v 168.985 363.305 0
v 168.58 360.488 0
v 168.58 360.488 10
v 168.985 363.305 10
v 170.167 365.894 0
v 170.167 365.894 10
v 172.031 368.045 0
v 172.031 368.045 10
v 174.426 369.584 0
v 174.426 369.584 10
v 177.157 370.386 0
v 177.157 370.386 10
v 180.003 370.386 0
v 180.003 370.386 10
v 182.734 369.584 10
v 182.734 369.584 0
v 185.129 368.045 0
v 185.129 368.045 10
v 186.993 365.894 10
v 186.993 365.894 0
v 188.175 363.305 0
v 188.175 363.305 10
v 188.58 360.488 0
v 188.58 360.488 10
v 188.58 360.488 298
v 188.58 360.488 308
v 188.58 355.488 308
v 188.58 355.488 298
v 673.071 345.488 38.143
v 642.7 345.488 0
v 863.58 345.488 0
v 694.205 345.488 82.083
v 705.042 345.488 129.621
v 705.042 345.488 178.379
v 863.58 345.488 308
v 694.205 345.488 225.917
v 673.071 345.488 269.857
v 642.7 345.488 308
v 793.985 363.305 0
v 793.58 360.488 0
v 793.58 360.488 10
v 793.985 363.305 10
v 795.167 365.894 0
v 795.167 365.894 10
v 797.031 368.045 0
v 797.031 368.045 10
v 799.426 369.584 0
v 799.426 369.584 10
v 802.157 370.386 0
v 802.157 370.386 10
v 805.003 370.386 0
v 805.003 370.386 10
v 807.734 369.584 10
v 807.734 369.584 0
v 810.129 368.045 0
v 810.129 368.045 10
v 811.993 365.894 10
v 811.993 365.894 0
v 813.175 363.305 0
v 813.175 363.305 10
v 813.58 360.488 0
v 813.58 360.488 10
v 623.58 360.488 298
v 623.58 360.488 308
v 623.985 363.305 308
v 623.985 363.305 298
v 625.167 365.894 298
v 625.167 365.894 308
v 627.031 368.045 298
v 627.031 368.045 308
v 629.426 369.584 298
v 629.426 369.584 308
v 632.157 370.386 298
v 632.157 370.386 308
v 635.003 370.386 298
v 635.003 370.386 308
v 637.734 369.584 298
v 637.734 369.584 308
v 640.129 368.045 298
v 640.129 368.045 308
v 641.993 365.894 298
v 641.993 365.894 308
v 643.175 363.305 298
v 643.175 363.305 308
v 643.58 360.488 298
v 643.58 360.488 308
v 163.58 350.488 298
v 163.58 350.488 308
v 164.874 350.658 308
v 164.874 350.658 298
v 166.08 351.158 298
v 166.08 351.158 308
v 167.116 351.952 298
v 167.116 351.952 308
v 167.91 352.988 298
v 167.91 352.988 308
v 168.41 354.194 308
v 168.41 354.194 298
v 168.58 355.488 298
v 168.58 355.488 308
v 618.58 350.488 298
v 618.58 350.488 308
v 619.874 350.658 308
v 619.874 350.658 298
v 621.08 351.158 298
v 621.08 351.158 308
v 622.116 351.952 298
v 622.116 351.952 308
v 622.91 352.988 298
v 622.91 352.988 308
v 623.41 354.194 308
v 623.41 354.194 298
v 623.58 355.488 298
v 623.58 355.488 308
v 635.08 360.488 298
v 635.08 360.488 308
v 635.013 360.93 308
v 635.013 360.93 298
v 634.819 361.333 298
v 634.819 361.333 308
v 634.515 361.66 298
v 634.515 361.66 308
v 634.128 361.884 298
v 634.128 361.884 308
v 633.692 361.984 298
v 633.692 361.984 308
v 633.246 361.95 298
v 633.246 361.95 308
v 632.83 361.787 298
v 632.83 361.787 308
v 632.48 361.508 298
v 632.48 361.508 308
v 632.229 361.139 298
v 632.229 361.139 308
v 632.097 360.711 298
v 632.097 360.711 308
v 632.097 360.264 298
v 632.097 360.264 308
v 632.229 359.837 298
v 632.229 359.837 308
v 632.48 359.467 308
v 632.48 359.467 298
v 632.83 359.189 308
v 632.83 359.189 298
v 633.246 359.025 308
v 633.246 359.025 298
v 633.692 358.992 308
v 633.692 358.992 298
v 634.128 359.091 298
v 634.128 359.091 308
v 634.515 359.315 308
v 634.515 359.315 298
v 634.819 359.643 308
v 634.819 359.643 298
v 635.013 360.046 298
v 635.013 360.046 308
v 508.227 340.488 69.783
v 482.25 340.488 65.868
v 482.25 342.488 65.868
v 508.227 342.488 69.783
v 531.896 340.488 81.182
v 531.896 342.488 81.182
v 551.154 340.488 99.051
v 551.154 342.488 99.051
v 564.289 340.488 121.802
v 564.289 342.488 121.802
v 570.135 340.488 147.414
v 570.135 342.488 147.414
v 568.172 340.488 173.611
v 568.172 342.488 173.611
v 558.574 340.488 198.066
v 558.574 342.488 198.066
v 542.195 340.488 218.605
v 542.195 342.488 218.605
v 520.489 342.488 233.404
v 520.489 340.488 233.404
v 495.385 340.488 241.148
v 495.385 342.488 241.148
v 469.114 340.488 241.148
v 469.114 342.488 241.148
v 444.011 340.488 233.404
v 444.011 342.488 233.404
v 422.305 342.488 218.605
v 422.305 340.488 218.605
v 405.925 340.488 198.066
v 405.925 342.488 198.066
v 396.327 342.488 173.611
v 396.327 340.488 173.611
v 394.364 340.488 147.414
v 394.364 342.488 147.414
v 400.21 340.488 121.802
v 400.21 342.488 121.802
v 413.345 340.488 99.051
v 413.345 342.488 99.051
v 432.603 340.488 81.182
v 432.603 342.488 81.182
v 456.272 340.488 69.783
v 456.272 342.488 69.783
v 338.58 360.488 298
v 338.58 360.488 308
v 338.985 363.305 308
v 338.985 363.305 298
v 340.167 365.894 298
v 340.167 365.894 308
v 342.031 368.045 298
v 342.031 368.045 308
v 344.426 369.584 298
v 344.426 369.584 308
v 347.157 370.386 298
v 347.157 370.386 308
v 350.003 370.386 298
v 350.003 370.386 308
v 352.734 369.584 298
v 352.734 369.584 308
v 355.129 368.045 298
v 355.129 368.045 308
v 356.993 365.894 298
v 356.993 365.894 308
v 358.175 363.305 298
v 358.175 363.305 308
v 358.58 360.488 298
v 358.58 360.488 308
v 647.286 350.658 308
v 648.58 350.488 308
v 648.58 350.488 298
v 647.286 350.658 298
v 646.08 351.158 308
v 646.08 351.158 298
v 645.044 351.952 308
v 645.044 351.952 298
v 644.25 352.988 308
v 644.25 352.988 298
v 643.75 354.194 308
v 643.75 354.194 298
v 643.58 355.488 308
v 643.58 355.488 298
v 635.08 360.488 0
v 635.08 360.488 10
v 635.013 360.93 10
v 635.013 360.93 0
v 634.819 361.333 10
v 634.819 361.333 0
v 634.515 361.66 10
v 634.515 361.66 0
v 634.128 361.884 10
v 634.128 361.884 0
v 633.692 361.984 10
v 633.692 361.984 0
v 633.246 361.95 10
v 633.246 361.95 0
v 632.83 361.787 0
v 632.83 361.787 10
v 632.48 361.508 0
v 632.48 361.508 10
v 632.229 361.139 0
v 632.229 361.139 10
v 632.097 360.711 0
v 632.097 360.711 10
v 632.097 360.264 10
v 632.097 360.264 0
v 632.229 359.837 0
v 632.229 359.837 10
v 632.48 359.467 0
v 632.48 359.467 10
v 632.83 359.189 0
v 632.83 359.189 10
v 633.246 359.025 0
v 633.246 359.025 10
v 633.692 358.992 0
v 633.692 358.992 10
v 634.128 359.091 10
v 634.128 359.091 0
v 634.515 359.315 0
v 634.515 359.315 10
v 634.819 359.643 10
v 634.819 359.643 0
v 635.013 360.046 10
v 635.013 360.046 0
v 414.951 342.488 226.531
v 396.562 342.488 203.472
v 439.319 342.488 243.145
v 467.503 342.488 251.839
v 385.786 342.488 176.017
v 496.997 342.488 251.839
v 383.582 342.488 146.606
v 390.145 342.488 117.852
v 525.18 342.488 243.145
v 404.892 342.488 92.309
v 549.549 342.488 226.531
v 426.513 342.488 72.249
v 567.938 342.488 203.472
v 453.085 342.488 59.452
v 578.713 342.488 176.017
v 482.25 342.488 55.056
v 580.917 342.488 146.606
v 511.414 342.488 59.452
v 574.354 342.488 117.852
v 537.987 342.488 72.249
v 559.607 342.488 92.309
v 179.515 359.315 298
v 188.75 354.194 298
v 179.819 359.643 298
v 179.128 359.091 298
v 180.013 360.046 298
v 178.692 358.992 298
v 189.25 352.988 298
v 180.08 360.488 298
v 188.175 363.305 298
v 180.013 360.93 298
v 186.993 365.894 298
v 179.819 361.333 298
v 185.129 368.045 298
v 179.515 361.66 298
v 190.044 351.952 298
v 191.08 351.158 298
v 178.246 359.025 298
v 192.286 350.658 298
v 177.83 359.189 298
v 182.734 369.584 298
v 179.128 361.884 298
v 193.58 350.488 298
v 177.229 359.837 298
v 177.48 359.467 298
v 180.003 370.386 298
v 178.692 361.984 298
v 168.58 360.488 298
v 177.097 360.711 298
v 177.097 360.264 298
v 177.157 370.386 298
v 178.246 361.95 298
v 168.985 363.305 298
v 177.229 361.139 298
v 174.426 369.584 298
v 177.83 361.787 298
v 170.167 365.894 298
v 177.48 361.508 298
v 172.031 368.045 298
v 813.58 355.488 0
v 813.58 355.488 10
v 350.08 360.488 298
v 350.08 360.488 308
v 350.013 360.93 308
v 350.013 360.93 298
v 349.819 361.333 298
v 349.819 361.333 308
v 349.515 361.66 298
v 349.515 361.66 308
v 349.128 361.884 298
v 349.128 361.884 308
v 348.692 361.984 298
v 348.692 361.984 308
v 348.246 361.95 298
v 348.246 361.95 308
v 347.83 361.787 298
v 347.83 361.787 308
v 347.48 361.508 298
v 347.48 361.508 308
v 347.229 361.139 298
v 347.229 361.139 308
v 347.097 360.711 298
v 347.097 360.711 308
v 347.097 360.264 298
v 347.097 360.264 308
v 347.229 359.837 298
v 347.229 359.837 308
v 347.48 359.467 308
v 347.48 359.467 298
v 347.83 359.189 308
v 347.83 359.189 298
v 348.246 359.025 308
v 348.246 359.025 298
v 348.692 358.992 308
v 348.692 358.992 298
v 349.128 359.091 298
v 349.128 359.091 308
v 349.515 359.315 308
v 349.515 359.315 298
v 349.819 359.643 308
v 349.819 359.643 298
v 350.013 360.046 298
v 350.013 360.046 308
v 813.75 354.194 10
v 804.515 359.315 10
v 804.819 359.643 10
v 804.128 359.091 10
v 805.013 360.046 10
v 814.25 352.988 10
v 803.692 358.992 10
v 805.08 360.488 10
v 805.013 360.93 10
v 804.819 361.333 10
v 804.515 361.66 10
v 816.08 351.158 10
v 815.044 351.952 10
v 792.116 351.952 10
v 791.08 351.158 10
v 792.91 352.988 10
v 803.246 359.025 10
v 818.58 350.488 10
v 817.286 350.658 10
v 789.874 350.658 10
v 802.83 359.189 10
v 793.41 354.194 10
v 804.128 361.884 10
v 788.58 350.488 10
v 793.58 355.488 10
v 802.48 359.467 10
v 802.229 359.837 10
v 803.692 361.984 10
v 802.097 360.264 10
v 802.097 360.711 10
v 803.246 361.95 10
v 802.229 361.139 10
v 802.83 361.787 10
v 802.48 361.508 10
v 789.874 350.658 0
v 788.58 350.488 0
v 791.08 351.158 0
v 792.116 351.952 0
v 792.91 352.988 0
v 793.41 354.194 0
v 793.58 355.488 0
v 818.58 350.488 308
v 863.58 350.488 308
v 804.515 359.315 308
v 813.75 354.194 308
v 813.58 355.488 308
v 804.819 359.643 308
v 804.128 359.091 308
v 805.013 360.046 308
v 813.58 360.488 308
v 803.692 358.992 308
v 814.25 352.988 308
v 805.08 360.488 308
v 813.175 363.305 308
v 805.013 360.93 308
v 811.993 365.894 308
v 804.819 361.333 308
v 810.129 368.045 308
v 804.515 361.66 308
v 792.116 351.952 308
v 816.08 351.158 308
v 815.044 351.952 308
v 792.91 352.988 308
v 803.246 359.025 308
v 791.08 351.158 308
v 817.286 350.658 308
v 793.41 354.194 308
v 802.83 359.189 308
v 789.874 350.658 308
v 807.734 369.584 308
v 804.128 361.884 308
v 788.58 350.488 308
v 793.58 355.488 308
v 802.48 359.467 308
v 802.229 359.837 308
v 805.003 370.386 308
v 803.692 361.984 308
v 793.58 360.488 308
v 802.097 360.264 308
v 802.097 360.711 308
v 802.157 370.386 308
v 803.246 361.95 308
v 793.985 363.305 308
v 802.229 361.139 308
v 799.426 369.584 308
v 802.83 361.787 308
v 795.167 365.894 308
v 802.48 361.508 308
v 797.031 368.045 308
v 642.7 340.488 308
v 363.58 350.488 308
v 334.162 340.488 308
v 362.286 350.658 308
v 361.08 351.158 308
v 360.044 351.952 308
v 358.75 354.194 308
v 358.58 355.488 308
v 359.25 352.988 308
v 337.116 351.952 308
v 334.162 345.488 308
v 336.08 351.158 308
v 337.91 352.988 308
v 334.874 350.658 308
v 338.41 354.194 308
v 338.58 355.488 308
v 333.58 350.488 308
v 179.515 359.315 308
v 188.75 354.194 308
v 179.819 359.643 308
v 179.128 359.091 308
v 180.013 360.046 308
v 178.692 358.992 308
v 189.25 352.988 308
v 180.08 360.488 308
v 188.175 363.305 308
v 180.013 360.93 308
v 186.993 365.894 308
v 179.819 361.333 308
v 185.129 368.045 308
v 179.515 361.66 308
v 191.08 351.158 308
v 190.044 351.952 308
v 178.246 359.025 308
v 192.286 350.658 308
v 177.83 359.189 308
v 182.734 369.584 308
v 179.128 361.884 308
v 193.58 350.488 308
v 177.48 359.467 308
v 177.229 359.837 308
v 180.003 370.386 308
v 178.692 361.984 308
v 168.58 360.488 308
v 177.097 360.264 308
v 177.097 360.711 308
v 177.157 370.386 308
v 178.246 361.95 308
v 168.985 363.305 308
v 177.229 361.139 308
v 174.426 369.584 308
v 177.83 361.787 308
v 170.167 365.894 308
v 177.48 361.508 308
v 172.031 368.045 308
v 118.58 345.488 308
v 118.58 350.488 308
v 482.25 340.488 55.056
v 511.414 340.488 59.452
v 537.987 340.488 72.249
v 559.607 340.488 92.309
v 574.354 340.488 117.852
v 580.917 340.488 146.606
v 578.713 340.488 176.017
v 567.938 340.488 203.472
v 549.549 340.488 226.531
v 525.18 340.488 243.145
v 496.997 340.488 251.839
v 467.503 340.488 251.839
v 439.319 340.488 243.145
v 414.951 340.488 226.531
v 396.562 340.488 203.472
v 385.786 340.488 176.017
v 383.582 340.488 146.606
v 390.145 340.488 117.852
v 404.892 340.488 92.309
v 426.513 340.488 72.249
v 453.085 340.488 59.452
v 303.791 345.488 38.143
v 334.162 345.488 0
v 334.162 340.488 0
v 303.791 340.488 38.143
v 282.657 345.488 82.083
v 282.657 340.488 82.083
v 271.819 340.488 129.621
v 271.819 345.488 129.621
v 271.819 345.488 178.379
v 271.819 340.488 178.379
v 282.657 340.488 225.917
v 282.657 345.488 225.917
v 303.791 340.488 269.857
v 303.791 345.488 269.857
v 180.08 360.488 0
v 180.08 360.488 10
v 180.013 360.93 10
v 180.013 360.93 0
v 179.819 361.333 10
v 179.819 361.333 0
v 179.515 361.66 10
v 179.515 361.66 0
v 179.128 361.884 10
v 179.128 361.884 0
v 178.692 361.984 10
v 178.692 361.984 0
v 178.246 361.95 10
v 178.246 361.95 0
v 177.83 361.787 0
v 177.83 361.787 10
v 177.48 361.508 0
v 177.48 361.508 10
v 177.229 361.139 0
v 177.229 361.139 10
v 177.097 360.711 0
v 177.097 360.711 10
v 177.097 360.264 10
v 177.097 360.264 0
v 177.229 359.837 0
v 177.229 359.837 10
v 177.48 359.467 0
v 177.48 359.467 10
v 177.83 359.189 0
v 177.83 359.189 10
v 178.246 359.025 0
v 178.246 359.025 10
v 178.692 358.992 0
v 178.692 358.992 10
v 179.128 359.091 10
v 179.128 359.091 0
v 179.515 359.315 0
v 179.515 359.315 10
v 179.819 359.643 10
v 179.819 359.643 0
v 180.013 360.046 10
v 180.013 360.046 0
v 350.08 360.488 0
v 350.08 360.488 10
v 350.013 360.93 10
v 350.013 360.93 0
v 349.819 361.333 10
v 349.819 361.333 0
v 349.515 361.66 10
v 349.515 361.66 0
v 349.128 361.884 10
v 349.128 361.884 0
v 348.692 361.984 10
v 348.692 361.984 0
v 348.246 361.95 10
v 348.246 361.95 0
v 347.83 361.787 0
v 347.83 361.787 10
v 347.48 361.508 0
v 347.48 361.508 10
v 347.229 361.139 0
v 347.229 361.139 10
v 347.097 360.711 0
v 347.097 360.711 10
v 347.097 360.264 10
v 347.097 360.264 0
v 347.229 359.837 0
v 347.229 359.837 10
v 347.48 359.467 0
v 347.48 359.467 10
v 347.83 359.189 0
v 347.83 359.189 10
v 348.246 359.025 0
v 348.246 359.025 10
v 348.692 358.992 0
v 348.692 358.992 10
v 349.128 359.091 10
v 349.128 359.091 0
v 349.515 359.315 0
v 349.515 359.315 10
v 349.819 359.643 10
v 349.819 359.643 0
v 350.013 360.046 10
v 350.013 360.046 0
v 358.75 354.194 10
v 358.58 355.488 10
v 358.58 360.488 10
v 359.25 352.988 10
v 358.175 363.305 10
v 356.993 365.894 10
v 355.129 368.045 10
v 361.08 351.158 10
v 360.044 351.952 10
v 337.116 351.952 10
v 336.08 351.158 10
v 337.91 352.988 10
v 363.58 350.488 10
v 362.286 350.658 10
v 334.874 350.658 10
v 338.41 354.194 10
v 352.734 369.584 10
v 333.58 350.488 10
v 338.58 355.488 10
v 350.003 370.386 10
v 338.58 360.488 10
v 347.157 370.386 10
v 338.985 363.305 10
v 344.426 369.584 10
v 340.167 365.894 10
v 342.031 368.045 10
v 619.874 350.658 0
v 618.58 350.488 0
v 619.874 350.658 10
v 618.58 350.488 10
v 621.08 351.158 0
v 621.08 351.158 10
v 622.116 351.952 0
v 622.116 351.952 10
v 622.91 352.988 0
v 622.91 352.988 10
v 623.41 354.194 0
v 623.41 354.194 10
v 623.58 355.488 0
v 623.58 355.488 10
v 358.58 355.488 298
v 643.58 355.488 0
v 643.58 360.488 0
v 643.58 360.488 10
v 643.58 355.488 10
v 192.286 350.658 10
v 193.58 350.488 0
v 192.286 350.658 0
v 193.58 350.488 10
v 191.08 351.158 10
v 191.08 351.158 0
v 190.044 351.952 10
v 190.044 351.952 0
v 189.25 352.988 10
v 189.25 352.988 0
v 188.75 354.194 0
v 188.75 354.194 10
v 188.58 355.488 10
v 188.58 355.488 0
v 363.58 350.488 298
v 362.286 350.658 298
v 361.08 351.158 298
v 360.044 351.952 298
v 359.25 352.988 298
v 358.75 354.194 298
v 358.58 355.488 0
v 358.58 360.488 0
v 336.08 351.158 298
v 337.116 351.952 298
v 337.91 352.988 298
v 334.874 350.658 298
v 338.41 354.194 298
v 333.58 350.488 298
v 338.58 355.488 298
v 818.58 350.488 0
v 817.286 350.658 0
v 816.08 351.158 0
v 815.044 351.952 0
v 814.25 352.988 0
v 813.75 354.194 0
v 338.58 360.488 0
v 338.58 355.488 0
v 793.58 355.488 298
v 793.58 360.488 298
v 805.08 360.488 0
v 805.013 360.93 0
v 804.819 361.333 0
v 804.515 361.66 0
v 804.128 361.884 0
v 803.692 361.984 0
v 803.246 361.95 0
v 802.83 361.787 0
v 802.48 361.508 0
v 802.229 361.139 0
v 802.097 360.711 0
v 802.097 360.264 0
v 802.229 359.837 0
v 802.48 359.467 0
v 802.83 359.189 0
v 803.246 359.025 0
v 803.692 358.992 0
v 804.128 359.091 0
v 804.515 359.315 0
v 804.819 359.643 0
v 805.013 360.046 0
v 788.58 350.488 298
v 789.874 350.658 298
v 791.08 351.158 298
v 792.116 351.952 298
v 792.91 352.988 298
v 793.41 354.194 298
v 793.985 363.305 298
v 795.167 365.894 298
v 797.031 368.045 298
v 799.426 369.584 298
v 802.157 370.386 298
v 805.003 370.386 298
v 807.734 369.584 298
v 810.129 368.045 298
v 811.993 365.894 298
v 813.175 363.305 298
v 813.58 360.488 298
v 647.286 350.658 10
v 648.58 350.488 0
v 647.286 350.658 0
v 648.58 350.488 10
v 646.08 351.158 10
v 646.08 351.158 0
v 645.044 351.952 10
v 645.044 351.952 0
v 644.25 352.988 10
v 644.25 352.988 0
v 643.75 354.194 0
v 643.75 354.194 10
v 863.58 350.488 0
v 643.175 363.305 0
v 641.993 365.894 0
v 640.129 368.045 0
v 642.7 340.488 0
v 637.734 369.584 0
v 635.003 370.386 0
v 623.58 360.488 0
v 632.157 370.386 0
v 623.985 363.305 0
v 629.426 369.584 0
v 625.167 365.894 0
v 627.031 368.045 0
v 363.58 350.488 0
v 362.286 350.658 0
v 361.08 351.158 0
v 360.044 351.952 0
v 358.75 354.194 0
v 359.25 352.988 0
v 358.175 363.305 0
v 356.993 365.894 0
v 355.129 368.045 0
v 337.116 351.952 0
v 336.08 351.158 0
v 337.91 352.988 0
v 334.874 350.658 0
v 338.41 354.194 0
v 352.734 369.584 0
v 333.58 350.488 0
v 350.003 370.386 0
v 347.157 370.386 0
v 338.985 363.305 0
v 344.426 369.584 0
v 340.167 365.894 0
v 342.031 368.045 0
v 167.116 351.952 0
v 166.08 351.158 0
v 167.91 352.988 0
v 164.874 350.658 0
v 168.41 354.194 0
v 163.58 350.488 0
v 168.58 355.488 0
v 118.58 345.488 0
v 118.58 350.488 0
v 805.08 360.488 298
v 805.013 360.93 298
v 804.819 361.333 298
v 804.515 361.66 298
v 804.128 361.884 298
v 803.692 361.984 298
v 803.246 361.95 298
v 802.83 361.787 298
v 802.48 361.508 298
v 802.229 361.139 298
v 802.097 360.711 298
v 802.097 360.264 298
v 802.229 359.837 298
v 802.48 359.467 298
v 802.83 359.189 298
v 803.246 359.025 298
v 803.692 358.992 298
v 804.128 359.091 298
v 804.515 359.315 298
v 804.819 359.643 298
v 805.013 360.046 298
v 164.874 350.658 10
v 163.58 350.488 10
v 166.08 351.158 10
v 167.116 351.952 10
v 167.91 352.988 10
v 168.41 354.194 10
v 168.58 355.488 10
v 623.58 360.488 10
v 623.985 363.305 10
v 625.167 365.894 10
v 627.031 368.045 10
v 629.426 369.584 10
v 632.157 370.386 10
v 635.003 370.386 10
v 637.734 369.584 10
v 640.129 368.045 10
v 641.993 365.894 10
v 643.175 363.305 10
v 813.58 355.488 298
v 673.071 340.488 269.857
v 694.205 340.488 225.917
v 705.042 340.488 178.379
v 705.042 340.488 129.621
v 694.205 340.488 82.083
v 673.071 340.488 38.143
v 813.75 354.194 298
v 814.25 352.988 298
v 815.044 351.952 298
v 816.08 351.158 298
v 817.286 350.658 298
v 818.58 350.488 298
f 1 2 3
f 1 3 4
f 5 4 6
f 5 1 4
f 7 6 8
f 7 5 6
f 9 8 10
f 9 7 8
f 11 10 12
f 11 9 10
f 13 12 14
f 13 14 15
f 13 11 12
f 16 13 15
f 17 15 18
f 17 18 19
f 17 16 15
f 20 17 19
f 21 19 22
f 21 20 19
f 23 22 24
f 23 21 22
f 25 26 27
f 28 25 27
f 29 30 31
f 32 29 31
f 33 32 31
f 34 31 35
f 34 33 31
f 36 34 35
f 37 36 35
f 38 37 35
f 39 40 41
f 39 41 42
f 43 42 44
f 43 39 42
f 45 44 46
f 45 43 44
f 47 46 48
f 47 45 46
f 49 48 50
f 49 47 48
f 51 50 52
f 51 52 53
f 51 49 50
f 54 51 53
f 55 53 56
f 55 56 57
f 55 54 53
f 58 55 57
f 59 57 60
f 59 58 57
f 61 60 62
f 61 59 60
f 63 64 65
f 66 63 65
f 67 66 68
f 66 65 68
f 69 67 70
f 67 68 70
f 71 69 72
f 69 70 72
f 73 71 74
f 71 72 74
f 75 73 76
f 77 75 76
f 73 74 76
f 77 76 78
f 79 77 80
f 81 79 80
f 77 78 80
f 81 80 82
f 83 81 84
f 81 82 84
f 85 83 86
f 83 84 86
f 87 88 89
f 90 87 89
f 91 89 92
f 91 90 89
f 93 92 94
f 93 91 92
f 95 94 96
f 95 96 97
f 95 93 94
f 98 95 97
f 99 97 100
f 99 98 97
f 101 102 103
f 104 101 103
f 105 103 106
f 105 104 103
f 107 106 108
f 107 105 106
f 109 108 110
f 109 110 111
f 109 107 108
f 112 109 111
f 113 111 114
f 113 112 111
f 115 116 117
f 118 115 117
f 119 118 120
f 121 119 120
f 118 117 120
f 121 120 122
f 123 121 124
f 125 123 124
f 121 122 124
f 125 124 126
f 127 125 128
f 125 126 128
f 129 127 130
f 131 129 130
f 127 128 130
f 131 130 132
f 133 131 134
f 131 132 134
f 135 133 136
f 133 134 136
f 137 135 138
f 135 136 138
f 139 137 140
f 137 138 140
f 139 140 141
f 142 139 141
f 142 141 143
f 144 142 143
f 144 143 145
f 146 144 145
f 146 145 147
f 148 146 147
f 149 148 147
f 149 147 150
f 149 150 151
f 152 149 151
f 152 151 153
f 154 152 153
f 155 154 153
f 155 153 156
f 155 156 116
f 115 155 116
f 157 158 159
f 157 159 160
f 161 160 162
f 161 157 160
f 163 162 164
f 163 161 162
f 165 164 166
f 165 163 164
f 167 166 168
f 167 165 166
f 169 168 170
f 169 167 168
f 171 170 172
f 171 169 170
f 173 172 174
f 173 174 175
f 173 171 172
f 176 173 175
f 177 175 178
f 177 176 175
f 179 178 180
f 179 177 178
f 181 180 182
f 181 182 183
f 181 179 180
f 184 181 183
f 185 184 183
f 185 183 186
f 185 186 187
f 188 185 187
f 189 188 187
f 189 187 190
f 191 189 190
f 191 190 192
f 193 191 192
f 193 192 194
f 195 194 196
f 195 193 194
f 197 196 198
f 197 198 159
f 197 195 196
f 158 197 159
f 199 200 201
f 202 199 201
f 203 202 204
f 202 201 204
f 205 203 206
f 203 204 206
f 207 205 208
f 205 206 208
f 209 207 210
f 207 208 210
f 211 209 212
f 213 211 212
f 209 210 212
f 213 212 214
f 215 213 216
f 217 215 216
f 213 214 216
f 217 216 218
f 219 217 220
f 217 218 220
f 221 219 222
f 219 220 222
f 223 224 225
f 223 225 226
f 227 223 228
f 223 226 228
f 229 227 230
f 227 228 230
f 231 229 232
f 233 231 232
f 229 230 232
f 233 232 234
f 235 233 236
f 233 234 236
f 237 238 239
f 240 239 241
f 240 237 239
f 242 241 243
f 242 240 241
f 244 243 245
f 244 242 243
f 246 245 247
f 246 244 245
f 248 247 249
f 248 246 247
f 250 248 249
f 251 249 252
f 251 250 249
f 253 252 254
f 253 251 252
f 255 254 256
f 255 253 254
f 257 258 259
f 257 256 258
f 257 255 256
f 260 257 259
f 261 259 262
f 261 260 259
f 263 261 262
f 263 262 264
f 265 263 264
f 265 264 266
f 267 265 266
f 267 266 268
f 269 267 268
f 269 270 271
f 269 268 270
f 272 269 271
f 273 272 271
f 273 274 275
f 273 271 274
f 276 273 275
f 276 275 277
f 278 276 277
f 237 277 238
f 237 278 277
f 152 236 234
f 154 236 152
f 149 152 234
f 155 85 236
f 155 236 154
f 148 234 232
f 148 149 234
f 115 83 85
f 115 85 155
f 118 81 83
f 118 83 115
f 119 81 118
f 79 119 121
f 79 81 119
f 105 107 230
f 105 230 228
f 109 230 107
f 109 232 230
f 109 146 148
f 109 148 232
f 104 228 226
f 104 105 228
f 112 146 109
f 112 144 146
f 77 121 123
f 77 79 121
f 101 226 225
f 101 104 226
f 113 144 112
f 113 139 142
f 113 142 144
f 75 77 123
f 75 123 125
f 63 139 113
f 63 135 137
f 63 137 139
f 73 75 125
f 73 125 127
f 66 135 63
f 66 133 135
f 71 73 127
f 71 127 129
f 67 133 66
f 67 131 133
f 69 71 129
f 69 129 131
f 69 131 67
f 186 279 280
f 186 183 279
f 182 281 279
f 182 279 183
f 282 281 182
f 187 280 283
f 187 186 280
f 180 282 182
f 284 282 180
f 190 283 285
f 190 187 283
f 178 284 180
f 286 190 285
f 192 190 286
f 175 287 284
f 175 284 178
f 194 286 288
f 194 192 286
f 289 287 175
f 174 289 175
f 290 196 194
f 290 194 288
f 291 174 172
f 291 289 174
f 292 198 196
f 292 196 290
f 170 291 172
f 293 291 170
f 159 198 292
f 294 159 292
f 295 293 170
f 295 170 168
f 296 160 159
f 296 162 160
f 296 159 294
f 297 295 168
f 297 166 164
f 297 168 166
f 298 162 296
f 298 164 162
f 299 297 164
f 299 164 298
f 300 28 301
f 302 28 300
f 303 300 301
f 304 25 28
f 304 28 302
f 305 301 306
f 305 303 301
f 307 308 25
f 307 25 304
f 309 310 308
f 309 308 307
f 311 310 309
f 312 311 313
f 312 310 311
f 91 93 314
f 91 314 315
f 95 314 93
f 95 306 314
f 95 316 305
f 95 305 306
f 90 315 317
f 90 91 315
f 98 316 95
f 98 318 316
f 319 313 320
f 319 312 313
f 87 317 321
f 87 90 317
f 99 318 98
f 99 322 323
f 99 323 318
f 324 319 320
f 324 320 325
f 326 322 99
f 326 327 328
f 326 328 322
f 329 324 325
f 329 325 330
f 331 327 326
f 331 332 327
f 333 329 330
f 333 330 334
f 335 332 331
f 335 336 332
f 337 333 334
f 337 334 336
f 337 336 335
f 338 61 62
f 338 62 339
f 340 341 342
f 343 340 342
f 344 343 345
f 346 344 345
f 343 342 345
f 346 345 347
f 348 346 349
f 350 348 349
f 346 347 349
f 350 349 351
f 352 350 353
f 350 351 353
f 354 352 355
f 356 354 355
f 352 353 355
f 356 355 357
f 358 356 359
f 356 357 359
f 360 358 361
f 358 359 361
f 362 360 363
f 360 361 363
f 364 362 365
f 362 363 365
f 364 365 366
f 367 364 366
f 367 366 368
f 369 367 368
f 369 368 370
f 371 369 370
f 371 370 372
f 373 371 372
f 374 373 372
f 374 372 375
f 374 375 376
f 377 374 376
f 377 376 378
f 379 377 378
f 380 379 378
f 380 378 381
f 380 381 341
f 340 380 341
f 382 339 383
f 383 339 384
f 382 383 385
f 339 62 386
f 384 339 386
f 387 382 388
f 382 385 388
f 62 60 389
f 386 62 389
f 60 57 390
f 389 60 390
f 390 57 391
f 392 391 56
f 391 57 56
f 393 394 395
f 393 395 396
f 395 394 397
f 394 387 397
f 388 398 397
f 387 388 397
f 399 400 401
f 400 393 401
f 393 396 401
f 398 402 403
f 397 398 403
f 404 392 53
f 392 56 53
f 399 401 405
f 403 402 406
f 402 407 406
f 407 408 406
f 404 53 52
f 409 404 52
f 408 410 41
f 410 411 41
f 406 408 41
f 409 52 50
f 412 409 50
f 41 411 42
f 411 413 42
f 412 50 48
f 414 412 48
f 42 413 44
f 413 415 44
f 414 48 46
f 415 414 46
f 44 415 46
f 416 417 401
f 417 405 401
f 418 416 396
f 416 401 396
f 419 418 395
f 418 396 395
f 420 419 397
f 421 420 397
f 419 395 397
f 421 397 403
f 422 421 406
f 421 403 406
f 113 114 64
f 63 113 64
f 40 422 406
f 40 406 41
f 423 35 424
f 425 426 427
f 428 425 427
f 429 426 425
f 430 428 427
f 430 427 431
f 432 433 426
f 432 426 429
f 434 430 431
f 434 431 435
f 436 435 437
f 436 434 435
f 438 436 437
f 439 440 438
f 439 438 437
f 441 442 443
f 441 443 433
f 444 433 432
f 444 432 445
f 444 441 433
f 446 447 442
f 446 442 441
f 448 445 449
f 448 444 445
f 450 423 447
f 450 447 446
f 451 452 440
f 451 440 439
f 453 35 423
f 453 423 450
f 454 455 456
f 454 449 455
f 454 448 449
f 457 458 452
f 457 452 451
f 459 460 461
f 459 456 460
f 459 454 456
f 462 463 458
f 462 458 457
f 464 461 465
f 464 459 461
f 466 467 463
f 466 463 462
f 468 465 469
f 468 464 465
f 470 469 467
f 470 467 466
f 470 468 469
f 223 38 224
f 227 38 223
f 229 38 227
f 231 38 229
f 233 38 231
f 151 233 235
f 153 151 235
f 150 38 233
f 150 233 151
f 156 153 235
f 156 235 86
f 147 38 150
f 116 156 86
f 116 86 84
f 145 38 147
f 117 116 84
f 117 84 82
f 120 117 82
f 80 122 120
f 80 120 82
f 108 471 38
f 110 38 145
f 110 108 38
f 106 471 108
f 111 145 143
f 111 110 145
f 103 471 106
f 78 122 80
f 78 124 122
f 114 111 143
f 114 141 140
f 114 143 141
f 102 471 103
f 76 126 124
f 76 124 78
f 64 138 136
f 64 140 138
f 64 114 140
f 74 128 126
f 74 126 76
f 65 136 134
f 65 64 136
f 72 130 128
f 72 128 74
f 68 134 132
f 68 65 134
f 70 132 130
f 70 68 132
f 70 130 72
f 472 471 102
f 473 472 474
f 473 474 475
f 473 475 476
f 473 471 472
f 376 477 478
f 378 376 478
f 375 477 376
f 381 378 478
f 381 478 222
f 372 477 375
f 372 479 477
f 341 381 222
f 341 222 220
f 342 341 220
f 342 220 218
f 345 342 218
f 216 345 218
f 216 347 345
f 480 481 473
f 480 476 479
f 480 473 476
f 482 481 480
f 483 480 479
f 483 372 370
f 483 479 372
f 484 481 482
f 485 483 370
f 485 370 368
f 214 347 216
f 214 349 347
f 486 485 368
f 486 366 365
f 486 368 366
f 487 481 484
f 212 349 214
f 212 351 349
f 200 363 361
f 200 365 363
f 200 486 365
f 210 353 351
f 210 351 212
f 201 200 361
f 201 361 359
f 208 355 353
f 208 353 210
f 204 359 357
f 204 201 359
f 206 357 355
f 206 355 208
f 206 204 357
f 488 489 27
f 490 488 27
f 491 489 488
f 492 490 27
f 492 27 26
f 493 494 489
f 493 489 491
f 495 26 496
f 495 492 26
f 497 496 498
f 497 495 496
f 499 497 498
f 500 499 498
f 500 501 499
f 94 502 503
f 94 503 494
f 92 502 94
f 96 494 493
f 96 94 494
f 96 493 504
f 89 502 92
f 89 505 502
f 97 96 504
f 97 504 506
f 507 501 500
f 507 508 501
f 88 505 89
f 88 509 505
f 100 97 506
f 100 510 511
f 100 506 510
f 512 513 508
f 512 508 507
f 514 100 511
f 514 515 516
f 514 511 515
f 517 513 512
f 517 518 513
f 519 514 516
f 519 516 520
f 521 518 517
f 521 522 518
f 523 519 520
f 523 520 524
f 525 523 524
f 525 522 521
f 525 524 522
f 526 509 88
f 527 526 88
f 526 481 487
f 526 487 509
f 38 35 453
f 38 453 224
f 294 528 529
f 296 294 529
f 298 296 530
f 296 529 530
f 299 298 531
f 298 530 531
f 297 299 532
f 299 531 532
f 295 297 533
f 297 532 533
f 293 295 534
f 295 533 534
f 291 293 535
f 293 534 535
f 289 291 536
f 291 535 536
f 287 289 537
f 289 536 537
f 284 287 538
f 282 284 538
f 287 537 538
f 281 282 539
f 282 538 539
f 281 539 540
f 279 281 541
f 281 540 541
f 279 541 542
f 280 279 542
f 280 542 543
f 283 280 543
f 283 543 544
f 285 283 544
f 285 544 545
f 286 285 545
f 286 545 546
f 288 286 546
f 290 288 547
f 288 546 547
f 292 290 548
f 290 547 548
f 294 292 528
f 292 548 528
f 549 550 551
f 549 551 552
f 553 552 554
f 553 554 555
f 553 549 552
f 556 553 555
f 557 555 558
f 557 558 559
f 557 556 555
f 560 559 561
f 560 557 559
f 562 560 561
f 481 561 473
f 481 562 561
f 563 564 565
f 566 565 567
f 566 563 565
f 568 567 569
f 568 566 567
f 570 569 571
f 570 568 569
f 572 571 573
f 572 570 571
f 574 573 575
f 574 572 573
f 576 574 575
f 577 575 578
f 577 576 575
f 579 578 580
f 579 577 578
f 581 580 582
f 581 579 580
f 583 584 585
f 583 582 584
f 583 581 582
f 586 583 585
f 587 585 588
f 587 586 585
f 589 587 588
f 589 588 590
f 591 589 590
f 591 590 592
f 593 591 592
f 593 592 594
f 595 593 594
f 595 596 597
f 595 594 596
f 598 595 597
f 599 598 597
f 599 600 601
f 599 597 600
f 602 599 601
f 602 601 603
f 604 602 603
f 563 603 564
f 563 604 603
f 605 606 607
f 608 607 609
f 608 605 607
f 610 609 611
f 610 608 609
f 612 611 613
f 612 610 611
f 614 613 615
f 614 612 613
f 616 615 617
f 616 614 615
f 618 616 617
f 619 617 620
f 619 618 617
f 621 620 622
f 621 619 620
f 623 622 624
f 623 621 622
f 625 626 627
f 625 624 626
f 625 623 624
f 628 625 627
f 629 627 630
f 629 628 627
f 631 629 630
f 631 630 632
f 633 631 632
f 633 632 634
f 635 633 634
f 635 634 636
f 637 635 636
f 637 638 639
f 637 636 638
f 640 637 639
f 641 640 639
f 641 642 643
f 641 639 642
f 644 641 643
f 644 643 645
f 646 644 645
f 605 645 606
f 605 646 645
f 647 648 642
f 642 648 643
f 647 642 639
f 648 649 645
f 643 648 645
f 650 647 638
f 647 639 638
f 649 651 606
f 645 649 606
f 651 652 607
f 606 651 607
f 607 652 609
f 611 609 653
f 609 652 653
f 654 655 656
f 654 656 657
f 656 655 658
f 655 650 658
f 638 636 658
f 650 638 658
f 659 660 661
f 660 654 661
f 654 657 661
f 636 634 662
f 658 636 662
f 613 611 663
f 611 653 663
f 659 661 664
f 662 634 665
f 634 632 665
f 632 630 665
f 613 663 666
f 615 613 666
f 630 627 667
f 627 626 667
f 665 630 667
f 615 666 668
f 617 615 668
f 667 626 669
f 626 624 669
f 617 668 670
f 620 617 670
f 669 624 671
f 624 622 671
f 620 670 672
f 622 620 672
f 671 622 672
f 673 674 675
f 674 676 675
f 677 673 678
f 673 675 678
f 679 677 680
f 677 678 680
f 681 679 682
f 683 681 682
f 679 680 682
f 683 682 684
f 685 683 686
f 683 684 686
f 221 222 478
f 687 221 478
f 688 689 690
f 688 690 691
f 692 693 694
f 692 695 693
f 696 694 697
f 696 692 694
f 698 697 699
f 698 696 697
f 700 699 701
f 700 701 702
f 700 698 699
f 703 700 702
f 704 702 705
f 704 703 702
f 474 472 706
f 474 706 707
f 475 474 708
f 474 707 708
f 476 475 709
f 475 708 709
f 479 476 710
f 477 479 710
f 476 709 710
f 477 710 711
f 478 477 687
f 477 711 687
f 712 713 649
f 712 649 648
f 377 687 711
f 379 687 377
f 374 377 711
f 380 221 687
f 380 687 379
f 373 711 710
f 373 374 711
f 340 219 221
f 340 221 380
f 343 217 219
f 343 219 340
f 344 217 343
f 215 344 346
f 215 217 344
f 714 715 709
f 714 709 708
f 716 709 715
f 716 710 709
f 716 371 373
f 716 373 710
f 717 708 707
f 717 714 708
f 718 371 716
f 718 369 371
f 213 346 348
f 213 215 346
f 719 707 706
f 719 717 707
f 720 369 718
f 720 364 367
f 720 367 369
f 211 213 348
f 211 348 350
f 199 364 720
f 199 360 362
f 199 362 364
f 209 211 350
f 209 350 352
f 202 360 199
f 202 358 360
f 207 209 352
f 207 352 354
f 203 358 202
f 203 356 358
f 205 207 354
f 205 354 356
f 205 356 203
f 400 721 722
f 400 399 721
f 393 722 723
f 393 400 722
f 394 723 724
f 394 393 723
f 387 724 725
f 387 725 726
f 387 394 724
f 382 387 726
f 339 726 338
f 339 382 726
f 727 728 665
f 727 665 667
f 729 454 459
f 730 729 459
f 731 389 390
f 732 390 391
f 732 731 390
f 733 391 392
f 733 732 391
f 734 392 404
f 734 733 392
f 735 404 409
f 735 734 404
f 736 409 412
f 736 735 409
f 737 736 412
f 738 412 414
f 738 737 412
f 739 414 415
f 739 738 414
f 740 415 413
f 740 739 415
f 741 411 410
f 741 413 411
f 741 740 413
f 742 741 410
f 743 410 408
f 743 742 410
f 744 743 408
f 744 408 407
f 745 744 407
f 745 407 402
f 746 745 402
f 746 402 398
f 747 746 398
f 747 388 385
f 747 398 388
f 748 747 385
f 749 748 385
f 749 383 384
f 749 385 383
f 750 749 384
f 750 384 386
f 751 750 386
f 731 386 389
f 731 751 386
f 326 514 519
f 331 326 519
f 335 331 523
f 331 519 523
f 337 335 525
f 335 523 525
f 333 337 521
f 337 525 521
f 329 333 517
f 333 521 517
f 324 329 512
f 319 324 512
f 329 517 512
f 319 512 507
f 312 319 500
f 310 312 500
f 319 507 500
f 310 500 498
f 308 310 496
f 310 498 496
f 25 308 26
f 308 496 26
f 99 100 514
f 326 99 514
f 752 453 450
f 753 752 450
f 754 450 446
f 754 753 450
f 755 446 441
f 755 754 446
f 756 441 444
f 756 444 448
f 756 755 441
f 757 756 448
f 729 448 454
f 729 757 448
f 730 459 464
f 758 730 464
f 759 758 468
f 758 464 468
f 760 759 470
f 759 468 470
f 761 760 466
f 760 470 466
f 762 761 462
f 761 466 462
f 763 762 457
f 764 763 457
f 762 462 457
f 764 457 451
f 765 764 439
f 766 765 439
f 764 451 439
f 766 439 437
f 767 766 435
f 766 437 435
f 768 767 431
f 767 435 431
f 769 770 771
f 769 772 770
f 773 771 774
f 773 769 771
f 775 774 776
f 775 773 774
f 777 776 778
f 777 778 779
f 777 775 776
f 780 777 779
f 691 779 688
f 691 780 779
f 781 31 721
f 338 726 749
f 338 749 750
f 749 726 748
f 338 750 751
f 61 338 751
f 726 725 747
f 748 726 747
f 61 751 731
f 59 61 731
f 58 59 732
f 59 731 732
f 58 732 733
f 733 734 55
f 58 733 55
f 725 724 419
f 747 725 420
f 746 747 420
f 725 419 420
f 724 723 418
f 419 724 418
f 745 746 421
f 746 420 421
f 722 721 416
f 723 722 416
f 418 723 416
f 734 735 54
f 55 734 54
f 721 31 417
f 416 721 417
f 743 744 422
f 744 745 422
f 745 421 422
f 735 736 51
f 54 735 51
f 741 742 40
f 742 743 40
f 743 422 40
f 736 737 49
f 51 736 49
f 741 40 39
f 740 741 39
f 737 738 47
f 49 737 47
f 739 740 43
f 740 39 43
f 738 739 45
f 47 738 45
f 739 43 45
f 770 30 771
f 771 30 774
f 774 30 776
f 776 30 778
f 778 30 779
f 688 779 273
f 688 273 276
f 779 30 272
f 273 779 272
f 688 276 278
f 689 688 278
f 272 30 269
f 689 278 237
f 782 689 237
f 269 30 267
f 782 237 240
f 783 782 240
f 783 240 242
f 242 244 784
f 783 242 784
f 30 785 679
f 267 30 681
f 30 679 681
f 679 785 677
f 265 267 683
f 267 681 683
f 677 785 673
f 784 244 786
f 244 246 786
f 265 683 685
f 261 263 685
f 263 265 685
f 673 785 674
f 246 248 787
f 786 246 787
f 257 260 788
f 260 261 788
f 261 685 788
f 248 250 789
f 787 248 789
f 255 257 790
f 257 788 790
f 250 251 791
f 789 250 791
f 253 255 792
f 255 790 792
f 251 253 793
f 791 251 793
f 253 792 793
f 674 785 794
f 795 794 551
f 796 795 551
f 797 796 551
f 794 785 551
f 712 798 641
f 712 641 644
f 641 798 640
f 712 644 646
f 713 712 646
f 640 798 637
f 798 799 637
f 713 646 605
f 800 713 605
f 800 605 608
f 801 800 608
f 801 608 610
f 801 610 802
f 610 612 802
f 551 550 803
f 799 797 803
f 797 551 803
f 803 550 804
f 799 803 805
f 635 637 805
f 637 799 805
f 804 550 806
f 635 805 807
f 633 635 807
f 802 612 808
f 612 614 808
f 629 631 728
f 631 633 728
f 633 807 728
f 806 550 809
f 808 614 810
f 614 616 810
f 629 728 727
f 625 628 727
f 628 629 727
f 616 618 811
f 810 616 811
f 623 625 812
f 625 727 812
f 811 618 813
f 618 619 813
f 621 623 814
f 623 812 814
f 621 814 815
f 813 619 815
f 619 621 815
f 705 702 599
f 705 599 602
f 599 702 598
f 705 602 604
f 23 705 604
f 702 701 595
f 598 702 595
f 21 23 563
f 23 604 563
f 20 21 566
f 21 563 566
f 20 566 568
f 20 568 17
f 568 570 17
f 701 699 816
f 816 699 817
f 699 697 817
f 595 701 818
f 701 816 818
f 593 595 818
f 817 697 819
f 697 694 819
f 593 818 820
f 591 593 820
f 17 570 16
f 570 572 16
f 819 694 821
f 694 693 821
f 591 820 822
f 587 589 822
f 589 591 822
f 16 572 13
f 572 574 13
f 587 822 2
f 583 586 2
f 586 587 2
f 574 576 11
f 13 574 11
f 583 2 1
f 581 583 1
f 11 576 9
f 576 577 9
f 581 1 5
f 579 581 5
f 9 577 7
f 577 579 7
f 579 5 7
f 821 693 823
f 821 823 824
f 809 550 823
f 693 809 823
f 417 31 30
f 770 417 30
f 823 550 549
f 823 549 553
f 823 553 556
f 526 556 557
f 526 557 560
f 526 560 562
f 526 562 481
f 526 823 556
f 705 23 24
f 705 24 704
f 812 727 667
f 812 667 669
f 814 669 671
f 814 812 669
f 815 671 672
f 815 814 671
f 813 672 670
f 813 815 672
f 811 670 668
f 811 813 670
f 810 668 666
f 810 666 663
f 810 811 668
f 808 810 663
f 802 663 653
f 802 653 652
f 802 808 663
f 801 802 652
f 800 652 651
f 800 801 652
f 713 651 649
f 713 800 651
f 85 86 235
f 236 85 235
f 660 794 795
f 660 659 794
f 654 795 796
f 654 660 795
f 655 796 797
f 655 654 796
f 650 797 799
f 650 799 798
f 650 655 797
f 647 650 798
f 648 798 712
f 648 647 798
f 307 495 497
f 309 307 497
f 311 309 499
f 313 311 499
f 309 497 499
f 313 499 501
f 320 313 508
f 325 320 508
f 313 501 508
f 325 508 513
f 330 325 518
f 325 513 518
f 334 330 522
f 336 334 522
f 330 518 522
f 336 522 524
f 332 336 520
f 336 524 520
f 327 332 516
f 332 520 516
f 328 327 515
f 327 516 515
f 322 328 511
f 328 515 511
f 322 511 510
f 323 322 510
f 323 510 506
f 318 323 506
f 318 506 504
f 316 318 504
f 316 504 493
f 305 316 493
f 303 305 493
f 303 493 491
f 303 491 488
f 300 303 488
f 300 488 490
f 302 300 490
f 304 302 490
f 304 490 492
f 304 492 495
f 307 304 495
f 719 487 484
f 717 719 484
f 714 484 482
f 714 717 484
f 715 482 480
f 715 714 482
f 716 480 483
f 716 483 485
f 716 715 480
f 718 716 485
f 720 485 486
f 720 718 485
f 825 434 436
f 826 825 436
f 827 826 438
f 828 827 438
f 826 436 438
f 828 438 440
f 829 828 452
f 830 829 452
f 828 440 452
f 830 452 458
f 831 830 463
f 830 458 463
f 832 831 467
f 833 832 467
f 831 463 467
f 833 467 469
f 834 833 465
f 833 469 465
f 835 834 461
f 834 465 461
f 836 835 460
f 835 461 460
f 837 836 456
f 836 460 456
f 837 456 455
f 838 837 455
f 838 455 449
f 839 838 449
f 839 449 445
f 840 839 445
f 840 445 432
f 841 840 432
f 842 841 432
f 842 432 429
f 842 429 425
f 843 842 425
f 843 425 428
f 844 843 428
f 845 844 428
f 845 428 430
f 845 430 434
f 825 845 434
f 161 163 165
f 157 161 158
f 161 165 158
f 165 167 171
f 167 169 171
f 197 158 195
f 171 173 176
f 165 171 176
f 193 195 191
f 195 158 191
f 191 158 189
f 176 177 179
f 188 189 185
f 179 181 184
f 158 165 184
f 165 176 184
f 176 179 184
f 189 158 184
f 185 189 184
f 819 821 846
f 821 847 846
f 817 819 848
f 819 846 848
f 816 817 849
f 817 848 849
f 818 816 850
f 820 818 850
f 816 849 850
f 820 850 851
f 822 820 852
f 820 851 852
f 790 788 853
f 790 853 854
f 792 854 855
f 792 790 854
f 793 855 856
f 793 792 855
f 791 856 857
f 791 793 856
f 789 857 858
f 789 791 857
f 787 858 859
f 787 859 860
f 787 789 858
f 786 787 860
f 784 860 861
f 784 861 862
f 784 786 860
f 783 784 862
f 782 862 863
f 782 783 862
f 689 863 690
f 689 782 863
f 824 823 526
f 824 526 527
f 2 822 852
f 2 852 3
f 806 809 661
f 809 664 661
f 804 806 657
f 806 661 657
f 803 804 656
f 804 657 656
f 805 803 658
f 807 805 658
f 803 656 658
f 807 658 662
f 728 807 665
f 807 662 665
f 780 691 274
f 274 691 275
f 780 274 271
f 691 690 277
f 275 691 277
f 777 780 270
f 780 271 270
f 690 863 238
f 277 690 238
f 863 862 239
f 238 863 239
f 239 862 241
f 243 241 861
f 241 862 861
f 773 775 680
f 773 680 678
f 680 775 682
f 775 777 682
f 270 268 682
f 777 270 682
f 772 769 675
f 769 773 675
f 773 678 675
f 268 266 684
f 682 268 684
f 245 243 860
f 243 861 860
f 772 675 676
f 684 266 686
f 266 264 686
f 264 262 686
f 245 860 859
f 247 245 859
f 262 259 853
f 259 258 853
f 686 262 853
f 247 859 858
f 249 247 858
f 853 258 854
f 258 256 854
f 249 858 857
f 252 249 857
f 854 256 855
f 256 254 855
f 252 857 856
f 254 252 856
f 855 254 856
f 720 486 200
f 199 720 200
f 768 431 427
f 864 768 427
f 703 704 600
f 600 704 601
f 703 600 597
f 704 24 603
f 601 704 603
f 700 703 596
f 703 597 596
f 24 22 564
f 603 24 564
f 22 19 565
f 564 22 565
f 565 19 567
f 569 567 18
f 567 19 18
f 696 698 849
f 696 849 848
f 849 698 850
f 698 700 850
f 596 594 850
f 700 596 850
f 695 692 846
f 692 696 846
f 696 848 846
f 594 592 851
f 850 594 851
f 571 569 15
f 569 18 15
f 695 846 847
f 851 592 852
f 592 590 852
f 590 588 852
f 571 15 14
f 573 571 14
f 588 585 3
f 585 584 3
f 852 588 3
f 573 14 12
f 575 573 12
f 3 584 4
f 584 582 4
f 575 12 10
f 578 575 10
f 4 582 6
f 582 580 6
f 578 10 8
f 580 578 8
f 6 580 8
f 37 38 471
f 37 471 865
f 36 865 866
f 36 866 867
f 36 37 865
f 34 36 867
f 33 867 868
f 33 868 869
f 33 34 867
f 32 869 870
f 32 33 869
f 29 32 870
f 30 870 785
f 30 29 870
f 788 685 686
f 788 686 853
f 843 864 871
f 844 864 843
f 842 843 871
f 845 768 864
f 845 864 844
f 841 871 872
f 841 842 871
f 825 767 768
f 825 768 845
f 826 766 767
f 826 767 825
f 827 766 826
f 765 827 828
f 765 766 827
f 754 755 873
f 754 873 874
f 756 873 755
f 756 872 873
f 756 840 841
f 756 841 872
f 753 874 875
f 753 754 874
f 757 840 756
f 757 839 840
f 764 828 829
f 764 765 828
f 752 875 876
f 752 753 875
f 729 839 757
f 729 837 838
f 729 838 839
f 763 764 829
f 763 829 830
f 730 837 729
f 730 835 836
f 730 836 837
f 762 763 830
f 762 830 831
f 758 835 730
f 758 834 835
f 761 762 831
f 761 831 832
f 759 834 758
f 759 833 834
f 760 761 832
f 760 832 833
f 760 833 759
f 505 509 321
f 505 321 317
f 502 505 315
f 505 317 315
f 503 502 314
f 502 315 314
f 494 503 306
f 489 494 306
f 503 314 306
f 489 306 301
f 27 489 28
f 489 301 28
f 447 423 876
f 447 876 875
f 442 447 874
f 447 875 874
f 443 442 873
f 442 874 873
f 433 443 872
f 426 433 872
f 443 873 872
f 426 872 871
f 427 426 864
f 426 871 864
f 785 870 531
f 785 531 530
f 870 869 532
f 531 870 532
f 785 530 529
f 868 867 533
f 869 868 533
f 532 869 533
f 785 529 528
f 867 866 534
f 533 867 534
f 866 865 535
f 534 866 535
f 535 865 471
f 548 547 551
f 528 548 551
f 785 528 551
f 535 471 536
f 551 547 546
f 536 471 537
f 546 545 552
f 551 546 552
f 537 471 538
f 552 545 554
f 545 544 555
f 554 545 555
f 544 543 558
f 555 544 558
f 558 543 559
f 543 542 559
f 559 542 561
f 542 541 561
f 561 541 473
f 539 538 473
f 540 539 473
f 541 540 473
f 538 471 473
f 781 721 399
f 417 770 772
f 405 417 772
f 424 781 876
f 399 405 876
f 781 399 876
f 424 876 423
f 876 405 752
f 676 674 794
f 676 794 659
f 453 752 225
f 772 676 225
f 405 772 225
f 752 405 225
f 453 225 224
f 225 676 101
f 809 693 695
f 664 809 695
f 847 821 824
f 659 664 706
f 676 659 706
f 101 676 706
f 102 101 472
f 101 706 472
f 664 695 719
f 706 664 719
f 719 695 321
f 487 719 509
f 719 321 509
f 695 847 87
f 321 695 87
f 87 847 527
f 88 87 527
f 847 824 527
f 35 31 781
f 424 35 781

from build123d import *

# Parameters (mm, degrees)
THICKEN2_START      = 118.58
THICKEN2_OUTLINE_W  = 5
THICKEN2_OUTLINE_H  = 308
THICKEN2_DEPTH      = 745
BOSS_EXTRUDE1_DEPTH = 10
SKETCH3_R           = 1.5
CUT_EXTRUDE1_DEPTH  = 298
FILLET1_R           = 5
FILLET2_R           = 5
BOSS_EXTRUDE2_DEPTH = 5
SKETCH5_R           = 98.944012136
SKETCH5_R_2         = 88.132026091
CUT_EXTRUDE2_DEPTH  = 2


# Read off the part's stored shape, not the designer's step: Thicken2
with BuildPart() as part:
    # Thicken2 outline → Thicken2 (new body)
    with BuildSketch(Plane.YZ.offset(THICKEN2_START)):
        with Locations((347.987717935, 154)):
            Rectangle(THICKEN2_OUTLINE_W, THICKEN2_OUTLINE_H)
    extrude(amount=THICKEN2_DEPTH)

    # Sketch2 → Boss-Extrude1 (add)
    with BuildSketch(Plane.XY.offset(308)):
        with BuildLine():
            Line((168.58, 350.487717935), (168.58, 360.487717935))
            ThreePointArc((168.58, 360.487717935), (178.58, 370.487717935), (188.58, 360.487717935))
            Line((188.58, 360.487717935), (188.58, 350.487717935))
            Line((188.58, 350.487717935), (168.58, 350.487717935))
        make_face()
        with BuildLine():
            Line((338.58, 350.487717935), (338.58, 360.487717935))
            ThreePointArc((338.58, 360.487717935), (348.58, 370.487717935), (358.58, 360.487717935))
            Line((358.58, 360.487717935), (358.58, 350.487717935))
            Line((358.58, 350.487717935), (338.58, 350.487717935))
        make_face()
        with BuildLine():
            Line((623.58, 350.487717935), (623.58, 360.487717935))
            ThreePointArc((623.58, 360.487717935), (633.58, 370.487717935), (643.58, 360.487717935))
            Line((643.58, 360.487717935), (643.58, 350.487717935))
            Line((643.58, 350.487717935), (623.58, 350.487717935))
        make_face()
        with BuildLine():
            Line((793.58, 350.487717935), (793.58, 360.487717935))
            ThreePointArc((793.58, 360.487717935), (803.58, 370.487717935), (813.58, 360.487717935))
            Line((813.58, 360.487717935), (813.58, 350.487717935))
            Line((813.58, 350.487717935), (793.58, 350.487717935))
        make_face()
    boss_extrude1 = extrude(amount=-BOSS_EXTRUDE1_DEPTH)

    # Sketch3 → Cut-Extrude1 (cut)
    with BuildSketch(Plane.XY.offset(308)):
        with Locations((178.58, 360.487717935)):
            Circle(SKETCH3_R)
        with Locations((348.58, 360.487717935)):
            Circle(SKETCH3_R)
        with Locations((633.58, 360.487717935)):
            Circle(SKETCH3_R)
        with Locations((803.58, 360.487717935)):
            Circle(SKETCH3_R)
    cut_extrude1 = extrude(amount=-CUT_EXTRUDE1_DEPTH, mode=Mode.SUBTRACT)

    # Fillet1
    fillet1_edges = [part.edges().sort_by_distance(p)[0] for p in [
        (188.58, 350.487717935, 303),
        (168.58, 350.487717935, 303),
        (358.58, 350.487717935, 303),
        (338.58, 350.487717935, 303),
        (643.58, 350.487717935, 303),
        (623.58, 350.487717935, 303),
        (813.58, 350.487717935, 303),
        (793.58, 350.487717935, 303),
    ]]
    fillet(fillet1_edges, radius=FILLET1_R)

    # Mirror2: Boss-Extrude1 across plane
    add(boss_extrude1.mirror(Plane.XY.offset(154)))

    # Mirror3: Cut-Extrude1 across plane
    add(cut_extrude1.mirror(Plane.XY.offset(154)), mode=Mode.SUBTRACT)

    # Fillet2
    fillet2_edges = [part.edges().sort_by_distance(p)[0] for p in [
        (168.58, 350.487717935, 5),
        (188.58, 350.487717935, 5),
        (338.58, 350.487717935, 5),
        (358.58, 350.487717935, 5),
        (623.58, 350.487717935, 5),
        (643.58, 350.487717935, 5),
        (793.58, 350.487717935, 5),
        (813.58, 350.487717935, 5),
    ]]
    fillet(fillet2_edges, radius=FILLET2_R)

    # Sketch4 → Boss-Extrude2 (add)
    with BuildSketch(Plane.XZ.offset(-345.487717935)):
        with BuildLine():
            Line((334.162131755, 308), (642.69967146, 308))
            ThreePointArc((642.69967146, 308), (706.409922047, 154), (642.69967146, 0))
            Line((642.69967146, 0), (334.162131755, 0))
            ThreePointArc((334.162131755, 0), (270.451881168, 154), (334.162131755, 308))
        make_face()
    extrude(amount=BOSS_EXTRUDE2_DEPTH)

    # Sketch5 → Cut-Extrude2 (cut)
    with BuildSketch(Plane.XZ.offset(-340.487717935)):
        with Locations(Location((482.249672024, 154, 0), (0, 0, 270))):
            Circle(SKETCH5_R)
        with Locations(Location((482.249672024, 154, 0), (0, 0, 270))):
            Circle(SKETCH5_R_2, mode=Mode.SUBTRACT)
    extrude(amount=-CUT_EXTRUDE2_DEPTH, mode=Mode.SUBTRACT)


solid = part.part
